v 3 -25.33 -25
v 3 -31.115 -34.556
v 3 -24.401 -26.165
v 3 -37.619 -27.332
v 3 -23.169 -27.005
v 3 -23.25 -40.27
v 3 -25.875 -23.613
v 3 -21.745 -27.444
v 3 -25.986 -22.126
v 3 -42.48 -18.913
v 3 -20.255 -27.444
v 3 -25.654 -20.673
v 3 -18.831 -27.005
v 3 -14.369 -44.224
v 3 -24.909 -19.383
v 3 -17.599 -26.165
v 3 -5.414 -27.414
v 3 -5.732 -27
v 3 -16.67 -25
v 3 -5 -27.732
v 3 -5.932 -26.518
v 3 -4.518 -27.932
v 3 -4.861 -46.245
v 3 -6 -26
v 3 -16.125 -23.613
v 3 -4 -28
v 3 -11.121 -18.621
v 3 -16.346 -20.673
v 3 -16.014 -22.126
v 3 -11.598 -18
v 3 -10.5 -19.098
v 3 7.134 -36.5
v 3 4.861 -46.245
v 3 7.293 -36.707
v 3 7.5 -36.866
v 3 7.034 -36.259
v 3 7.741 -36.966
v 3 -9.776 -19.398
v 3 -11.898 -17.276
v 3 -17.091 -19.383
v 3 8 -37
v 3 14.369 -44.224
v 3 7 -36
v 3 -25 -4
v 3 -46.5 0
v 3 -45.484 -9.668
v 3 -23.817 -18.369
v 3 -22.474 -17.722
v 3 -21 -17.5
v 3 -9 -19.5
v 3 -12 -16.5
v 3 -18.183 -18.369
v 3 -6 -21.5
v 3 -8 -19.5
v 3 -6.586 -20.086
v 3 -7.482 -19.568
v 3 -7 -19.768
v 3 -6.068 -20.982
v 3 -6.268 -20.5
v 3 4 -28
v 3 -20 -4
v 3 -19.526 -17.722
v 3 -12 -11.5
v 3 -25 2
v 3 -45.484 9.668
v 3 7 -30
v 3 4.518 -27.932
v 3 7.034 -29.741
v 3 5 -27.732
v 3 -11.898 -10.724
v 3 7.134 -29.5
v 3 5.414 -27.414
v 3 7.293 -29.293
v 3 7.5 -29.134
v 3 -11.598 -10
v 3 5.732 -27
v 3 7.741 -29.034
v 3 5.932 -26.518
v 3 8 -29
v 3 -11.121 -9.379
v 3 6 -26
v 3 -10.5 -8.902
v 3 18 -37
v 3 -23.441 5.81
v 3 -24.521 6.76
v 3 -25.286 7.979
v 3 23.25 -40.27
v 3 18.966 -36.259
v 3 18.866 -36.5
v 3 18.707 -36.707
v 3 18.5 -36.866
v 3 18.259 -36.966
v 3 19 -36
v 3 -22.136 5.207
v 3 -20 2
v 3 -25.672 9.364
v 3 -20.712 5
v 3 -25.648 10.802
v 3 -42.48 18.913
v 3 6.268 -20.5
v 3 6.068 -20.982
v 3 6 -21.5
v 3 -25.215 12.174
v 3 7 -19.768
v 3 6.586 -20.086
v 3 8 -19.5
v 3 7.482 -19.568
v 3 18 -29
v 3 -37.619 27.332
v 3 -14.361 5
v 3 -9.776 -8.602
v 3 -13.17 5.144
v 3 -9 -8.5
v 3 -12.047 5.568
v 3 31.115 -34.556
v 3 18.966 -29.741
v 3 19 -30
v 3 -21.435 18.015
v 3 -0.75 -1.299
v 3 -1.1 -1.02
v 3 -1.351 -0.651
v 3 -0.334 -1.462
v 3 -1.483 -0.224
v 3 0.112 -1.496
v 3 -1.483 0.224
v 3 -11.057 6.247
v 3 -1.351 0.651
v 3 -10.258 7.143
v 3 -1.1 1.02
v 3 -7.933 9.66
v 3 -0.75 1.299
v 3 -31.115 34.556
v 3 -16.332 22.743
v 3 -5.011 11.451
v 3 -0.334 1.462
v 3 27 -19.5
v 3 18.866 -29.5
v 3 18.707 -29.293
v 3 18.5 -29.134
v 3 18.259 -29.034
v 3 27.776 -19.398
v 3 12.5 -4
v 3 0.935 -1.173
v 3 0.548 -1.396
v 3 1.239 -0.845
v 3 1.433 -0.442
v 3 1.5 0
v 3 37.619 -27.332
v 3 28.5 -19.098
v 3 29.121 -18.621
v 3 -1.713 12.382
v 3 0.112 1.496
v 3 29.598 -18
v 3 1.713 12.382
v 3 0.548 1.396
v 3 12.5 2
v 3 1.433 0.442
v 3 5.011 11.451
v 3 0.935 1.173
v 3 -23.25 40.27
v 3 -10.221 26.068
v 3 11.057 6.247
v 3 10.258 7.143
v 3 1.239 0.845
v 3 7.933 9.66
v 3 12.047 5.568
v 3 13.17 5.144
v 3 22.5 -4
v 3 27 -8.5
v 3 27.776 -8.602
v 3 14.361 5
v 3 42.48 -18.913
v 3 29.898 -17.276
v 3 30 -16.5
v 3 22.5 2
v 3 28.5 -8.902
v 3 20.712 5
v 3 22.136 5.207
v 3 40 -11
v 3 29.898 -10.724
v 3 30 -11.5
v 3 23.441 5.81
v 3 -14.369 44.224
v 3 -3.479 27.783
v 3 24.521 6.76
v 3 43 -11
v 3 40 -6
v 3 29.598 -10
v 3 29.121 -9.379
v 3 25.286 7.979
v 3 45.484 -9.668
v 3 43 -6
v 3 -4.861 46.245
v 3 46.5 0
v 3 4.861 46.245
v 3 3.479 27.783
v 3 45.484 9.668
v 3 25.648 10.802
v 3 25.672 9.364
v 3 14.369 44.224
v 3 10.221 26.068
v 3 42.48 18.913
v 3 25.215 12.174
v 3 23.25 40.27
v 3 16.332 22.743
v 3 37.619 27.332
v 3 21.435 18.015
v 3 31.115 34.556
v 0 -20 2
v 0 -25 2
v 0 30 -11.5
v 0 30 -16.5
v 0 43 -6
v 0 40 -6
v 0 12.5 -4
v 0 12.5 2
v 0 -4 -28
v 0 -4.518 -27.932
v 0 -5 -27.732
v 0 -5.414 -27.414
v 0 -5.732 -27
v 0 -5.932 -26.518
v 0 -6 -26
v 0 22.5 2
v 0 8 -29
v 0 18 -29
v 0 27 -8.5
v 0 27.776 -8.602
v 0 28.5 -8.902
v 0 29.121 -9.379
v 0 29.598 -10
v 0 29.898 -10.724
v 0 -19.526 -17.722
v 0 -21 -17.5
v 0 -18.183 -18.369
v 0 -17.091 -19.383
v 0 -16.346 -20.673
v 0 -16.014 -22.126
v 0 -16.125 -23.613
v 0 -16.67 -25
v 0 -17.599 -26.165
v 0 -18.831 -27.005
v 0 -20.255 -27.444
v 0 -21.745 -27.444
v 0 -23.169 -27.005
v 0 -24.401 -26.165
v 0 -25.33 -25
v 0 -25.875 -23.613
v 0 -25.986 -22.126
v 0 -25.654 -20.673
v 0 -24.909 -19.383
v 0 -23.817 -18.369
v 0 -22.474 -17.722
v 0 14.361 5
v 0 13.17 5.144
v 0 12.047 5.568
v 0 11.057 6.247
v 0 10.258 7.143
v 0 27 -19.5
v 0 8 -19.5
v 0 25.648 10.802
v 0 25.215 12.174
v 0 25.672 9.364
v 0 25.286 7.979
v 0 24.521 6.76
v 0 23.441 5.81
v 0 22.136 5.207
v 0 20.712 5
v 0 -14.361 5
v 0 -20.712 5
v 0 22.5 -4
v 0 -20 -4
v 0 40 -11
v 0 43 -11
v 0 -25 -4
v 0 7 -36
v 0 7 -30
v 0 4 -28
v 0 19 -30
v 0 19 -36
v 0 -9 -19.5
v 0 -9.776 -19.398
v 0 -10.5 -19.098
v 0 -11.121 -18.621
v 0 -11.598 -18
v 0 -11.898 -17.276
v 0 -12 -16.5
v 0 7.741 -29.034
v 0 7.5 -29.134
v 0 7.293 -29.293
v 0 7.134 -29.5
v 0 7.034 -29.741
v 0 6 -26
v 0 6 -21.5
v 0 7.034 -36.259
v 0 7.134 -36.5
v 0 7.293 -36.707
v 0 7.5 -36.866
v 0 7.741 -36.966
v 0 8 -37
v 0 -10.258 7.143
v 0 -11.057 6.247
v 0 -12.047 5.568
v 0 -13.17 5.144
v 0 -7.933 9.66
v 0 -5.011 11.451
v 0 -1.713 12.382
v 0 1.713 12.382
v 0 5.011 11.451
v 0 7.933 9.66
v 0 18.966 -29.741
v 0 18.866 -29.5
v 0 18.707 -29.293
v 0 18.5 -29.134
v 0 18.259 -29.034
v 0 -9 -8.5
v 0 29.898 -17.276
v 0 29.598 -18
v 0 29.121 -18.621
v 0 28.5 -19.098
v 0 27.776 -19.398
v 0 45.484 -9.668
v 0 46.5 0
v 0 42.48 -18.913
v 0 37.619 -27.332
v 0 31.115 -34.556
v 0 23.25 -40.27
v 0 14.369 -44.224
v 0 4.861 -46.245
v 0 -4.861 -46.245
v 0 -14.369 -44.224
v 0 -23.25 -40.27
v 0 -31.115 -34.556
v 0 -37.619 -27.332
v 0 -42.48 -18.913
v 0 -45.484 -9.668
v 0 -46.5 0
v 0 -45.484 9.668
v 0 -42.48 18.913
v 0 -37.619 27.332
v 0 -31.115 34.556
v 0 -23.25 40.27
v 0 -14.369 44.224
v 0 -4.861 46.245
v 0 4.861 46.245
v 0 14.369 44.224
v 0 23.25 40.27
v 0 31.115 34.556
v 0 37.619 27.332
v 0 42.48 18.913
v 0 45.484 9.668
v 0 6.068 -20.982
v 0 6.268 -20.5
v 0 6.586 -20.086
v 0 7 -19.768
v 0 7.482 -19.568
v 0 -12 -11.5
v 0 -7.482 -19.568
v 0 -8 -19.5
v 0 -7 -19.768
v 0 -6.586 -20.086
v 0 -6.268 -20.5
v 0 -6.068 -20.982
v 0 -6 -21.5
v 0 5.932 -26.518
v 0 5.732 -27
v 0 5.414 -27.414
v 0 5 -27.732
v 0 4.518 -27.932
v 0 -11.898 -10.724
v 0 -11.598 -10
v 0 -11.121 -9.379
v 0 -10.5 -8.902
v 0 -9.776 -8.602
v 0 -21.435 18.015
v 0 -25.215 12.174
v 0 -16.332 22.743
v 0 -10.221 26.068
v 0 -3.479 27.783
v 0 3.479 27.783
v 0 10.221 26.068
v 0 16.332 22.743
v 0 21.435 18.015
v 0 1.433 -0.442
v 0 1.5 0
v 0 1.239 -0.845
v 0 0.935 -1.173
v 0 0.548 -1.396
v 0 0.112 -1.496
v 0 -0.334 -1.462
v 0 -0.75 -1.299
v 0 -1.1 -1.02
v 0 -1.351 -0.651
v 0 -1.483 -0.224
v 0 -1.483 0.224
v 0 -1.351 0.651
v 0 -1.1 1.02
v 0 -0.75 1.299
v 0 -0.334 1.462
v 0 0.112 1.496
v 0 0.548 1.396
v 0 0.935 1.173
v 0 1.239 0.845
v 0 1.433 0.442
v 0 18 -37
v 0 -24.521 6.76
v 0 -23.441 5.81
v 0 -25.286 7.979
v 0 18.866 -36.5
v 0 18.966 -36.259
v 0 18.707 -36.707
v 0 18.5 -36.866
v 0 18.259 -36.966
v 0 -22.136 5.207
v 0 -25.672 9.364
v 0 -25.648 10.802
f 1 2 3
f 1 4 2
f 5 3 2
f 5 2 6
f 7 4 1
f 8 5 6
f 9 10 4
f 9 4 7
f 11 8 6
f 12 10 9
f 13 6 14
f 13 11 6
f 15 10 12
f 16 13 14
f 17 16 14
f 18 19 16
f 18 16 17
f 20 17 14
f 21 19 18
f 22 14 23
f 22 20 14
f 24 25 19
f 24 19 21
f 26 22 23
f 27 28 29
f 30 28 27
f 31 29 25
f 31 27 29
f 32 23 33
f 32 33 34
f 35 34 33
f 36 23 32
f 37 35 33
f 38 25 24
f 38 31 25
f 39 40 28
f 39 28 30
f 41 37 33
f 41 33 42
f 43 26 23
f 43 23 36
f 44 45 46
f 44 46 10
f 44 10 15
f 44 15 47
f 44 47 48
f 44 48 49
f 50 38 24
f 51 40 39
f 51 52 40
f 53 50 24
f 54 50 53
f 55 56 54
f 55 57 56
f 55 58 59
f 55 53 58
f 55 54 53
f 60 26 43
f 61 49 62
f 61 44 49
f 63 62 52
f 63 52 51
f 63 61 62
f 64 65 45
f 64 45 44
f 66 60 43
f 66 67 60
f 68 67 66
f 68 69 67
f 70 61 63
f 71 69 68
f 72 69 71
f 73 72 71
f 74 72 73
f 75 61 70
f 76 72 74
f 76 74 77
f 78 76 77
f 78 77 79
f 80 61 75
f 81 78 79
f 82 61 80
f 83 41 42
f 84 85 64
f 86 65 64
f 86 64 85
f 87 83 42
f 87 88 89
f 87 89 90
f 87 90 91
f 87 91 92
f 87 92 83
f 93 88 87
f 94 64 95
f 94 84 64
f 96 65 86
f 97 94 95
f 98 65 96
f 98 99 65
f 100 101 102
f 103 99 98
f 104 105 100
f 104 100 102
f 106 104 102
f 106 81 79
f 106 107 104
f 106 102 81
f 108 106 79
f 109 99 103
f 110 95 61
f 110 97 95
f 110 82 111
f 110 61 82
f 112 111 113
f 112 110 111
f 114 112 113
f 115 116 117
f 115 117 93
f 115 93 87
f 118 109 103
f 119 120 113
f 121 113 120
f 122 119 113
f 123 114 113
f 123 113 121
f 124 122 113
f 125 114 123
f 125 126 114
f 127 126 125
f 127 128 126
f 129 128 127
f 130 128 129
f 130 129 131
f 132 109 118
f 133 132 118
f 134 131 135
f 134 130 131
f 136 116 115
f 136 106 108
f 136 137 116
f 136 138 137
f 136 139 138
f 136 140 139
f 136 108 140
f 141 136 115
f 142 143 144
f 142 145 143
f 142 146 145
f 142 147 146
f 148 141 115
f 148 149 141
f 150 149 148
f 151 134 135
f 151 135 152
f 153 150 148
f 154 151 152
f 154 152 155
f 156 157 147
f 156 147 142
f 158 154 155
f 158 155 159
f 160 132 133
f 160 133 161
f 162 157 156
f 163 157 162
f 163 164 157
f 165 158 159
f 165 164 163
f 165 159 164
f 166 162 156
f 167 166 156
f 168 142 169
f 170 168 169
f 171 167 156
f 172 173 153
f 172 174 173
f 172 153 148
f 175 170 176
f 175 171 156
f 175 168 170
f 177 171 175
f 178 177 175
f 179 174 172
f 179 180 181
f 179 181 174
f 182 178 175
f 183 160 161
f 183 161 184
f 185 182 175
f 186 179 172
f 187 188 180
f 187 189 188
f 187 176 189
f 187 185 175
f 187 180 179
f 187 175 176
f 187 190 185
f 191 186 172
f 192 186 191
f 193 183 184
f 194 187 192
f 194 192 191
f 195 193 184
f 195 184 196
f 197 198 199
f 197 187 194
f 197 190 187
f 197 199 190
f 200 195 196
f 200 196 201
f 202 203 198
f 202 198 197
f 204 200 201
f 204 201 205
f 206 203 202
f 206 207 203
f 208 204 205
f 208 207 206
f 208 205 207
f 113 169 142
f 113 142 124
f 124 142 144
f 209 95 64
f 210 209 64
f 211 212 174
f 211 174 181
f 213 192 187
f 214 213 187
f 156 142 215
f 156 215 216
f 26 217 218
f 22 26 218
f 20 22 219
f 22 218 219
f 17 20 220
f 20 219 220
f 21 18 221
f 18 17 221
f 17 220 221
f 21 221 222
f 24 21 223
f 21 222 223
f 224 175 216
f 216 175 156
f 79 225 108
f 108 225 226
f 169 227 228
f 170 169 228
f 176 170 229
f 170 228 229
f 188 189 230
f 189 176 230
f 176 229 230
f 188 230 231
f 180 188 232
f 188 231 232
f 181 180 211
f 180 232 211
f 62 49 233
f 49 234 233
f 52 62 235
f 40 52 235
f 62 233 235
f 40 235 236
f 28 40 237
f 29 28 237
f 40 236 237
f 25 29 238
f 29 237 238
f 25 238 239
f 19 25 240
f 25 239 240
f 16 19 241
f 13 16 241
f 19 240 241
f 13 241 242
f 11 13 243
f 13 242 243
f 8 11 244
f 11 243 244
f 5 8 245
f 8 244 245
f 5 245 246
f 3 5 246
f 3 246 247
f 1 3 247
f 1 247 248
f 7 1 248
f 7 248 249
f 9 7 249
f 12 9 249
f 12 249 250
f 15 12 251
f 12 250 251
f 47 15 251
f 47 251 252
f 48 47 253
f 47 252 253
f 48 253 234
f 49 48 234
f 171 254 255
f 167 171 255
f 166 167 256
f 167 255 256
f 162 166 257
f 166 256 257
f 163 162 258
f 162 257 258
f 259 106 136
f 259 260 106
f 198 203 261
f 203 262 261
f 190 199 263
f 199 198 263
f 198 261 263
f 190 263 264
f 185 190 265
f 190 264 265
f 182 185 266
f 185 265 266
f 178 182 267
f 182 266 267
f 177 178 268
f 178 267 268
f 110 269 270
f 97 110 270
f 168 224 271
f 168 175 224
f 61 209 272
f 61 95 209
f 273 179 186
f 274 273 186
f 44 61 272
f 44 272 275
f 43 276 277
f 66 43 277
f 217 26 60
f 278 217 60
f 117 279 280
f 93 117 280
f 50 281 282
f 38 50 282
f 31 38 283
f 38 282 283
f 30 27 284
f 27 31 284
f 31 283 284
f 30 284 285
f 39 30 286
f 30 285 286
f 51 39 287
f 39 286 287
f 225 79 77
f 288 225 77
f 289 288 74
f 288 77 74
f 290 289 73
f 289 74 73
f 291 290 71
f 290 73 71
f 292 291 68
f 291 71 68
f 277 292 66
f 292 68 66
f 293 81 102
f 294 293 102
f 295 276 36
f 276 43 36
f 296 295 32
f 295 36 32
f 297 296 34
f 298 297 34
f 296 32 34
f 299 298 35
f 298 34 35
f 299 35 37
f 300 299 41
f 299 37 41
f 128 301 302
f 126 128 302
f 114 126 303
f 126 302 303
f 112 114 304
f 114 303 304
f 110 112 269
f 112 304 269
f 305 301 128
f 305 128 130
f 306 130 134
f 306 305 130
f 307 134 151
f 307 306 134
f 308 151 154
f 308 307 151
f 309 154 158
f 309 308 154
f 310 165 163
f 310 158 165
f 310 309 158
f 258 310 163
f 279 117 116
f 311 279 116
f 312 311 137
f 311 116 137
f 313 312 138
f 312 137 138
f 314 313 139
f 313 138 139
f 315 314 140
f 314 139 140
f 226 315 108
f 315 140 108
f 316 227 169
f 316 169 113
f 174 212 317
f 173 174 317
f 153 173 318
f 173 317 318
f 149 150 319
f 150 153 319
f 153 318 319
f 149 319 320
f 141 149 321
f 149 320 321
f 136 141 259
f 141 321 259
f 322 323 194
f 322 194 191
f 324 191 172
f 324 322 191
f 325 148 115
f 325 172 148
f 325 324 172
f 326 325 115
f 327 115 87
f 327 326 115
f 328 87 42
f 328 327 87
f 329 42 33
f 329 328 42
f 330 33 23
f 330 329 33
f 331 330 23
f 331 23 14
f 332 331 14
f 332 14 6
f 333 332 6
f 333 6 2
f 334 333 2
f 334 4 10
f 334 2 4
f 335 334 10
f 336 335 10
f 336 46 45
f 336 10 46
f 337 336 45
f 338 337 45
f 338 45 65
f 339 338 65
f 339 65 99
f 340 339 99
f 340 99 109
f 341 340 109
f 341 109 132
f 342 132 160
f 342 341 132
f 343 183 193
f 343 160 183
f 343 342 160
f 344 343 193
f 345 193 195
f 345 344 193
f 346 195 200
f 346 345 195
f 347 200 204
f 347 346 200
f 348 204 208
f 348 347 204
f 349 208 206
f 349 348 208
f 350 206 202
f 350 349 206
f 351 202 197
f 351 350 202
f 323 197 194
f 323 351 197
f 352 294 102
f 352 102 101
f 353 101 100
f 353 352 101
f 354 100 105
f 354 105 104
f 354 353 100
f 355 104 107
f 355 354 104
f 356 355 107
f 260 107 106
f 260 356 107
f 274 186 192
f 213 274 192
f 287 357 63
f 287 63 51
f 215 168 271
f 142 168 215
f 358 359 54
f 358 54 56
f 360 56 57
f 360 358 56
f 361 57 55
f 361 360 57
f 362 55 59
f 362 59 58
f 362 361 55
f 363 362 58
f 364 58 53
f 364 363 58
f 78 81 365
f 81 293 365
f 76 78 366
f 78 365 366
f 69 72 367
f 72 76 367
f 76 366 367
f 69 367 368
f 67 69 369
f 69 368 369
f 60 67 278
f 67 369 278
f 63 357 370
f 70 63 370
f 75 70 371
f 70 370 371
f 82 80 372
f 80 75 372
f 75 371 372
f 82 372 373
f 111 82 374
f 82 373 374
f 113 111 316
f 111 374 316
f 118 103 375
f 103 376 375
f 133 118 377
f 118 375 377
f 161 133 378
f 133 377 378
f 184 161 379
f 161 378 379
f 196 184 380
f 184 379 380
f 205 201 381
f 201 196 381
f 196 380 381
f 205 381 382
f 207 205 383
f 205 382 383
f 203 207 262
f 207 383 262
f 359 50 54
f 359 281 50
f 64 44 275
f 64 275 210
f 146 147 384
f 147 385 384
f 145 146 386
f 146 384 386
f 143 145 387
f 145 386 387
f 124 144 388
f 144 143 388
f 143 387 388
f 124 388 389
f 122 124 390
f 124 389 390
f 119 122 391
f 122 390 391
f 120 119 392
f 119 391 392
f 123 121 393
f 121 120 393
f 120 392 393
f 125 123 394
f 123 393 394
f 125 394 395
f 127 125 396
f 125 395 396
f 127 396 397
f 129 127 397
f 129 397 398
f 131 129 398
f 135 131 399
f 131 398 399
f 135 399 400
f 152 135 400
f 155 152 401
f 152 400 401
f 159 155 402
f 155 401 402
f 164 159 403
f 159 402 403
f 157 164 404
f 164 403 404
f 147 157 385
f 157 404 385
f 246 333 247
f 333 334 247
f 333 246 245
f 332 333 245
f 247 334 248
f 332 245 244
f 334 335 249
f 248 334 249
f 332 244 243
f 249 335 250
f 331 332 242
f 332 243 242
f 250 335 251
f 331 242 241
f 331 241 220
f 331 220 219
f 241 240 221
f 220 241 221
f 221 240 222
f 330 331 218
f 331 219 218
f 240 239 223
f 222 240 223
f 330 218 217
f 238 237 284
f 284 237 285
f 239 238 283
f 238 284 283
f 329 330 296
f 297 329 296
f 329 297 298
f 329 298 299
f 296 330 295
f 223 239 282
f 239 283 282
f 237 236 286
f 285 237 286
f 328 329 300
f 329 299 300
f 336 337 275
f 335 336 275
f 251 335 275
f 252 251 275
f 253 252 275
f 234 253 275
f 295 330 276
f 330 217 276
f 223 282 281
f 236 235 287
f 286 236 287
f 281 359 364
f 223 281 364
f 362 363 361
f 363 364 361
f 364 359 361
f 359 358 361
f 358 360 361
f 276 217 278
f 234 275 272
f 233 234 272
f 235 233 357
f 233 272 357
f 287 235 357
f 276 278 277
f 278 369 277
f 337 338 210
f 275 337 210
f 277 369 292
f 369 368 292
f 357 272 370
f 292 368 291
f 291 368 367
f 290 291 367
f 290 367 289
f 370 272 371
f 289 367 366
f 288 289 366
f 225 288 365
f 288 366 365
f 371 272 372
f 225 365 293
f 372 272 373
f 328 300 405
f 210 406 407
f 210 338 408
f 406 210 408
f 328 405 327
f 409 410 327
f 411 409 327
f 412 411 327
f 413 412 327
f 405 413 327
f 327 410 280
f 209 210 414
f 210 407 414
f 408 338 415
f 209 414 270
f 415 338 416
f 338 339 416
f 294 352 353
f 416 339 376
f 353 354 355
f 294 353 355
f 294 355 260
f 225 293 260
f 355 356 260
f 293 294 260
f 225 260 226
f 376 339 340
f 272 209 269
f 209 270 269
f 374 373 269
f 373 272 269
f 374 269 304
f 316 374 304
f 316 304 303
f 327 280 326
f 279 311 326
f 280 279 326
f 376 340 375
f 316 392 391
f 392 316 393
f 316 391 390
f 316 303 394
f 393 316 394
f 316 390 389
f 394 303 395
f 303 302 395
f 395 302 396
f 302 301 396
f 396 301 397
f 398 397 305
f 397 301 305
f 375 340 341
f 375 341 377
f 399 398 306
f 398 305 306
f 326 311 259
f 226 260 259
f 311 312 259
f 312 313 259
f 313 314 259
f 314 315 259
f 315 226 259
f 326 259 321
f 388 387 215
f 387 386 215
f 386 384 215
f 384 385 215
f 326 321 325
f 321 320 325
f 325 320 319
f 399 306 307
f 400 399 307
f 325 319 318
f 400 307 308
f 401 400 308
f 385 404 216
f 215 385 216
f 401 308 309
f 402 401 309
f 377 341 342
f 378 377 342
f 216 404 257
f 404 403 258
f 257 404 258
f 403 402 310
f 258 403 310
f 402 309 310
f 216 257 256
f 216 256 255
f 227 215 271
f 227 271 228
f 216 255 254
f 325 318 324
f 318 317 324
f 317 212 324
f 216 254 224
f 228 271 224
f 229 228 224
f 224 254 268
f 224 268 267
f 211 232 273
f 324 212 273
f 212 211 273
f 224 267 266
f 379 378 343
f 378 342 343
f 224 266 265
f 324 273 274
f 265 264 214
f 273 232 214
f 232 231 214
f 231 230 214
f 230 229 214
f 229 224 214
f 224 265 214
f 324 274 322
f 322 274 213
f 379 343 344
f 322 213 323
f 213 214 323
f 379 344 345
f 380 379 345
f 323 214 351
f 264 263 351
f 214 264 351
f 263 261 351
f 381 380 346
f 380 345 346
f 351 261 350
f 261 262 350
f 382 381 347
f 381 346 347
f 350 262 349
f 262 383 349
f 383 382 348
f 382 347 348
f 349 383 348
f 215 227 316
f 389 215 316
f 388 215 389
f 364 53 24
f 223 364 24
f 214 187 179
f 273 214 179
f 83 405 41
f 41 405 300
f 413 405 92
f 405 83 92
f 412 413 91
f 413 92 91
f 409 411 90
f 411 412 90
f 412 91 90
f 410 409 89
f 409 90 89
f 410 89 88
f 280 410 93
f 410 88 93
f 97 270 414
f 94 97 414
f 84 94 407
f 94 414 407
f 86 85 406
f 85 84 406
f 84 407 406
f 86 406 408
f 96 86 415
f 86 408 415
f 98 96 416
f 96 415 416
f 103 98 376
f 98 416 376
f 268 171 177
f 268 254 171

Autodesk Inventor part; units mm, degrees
ref_plane "YZ Plane" through (0, 0, 0) normal (1, 0, 0) x (0, 1, 0)
ref_plane "XZ Plane" through (0, 0, 0) normal (0, 1, 0) x (-1, 0, 0)
ref_plane "XY Plane" through (0, 0, 0) normal (0, 0, 1) x (1, 0, 0)
sketch "Sketch1" plane through (0, 0, 0) normal (1, 0, 0) x (0, 1, 0)
  arc A0 (25.215, 12.1739) -> (-25.215, 12.1739) centre (0, 0) ccw
  arc A1 (10.2581, 7.1429) -> (-10.2581, 7.1429) centre (0, 0) ccw
  circle A2 centre (0, 0) radius 1.5
  line L0 (-14.3614, 5) -> (-20.7123, 5)
  line L1 (14.3614, 5) -> (20.7123, 5)
  arc A3 (-25.215, 12.1739) -> (-20.7123, 5) centre (-20.7123, 10) ccw
  arc A4 (-14.3614, 5) -> (-10.2581, 7.1429) centre (-14.3614, 10) ccw
  arc A5 (10.2581, 7.1429) -> (14.3614, 5) centre (14.3614, 10) ccw
  arc A6 (20.7123, 5) -> (25.215, 12.1739) centre (20.7123, 10) ccw
  line L2 (27, -8.5) -> (-9, -8.5)
  line L3 (-12, -11.5) -> (-12, -8.988)
  arc A7 (-9, -8.5) -> (-12, -11.5) centre (-9, -11.5) ccw
  line L4 (-9, -19.5) -> (27, -19.5)
  line L5 (30, -16.5) -> (30, -11.5)
  circle A8 centre (0, 0) radius 46.5
  line L6 (-12, -11.5) -> (-12, -16.5)
  arc A9 (-12, -16.5) -> (-9, -19.5) centre (-9, -16.5) ccw
  arc A10 (27, -19.5) -> (30, -16.5) centre (27, -16.5) ccw
  arc A11 (30, -11.5) -> (27, -8.5) centre (27, -11.5) ccw
  point P0 (7.4416, -10.0435)
  point P1 (-11.4564, 5)
  point P2 (11.4564, 5)
  point P3 (-27.55, 5)
  point P4 (27.55, 5)
  dimension "d5" = 28
  dimension "d6" = 25
  dimension "d7" = 3
  dimension "d53" = 5
  dimension "d54" = 5
  dimension "d86" = 12
  dimension "d90" = 8.5
  dimension "d91" = 3
  dimension "d95" = 93
  dimension "d96" = 3
  dimension "d97" = 42
  dimension "d98" = 11
extrude "Extrusion3" add sketch "Sketch1" along normal blind 3
sketch "Sketch2" plane through (3, 0, 0) normal (1, 0, 0) x (0, 0, -1)
  arc A0 (-12.1739, 25.215) -> (-12.1739, -25.215) centre (0, 0) ccw projected
  line L0 (11, 43) -> (6, 43)
  line L1 (6, 43) -> (6, 40)
  line L2 (6, 40) -> (11, 40)
  line L3 (11, 40) -> (11, 43)
  dimension "d99" = 5
  dimension "d100" = 3
  dimension "d101" = 40
  dimension "d102" = 6
extrude "Extrusion5" cut sketch "Sketch2" against normal through all
sketch "Sketch4" plane through (3, 0, 0) normal (1, 0, 0) x (0, 0, -1)
  arc A0 (-12.1739, 25.215) -> (-12.1739, -25.215) centre (0, 0) ccw projected
  line L0 (-2, -20) -> (4, -20)
  line L1 (4, -20) -> (4, -25)
  line L2 (4, -25) -> (-2, -25)
  line L3 (-2, 22.5) -> (4, 22.5)
  line L4 (4, 22.5) -> (4, 12.5)
  line L5 (4, 12.5) -> (-2, 12.5)
  line L6 (-2, 22.5) -> (-2, 12.5)
  line L7 (-5, 20.7123) -> (-5, 14.3614) projected
  line L8 (-2, -20) -> (-2, -25)
  line L9 (6, 40) -> (6, 43) projected
  dimension "d59" = 5
  dimension "d60" = 20
  dimension "d62" = 10
  dimension "d63" = 12.5
  dimension "d94" = 6
  dimension "d104" = 2
extrude "Extrusion6" cut sketch "Sketch4" against normal through all
sketch "Sketch7" plane through (3, 0, 0) normal (1, 0, 0) x (0, 0, -1)
  line L0 (19.5, -6) -> (28, -6)
  line L1 (28, -6) -> (28, 6)
  line L2 (28, 6) -> (19.5, 6)
  line L3 (19.5, 6) -> (19.5, -6)
  line L4 (19.5, 27) -> (19.5, -9) projected
  point P0 (0, 0)
  point P1 (19.5, 0)
  dimension "d105" = 12
  dimension "d106" = 8.5
extrude "Extrusion9" cut sketch "Sketch7" against normal through all
fillet "Fillet1" radius 2 4 edges at (1.5, -6, -19.5) (1.5, -6, -28) (1.5, 6, -28) (1.5, 6, -19.5)
sketch "Sketch8" plane through (0, 0, 0) normal (-1, 0, 0) x (0, 0, 1)
  line L0 (-37, 7) -> (-29, 7)
  line L1 (-29, 7) -> (-29, 19)
  line L2 (-29, 19) -> (-37, 19)
  line L3 (-37, 19) -> (-37, 7)
  point P0 (0, 0)
  dimension "d110" = 12
  dimension "d111" = 8
  dimension "d112" = 29
  dimension "d113" = 7
extrude "Extrusion10" cut sketch "Sketch8" against normal through all
fillet "Fillet2" radius 1 4 edges at (1.5, 7, -29) (1.5, 7, -37) (1.5, 19, -37) (1.5, 19, -29)
sketch "Sketch9" plane through (0, 0, 0) normal (-1, 0, 0) x (0, 0, 1)
  circle A0 centre (-22.5, -21) radius 5
  point P0 (0, 0)
  dimension "d117" = 10
  dimension "d118" = 22.5
  dimension "d119" = 21
extrude "Extrusion11" cut sketch "Sketch9" against normal through all
properties part number "2.8chassis side DB25V3"
